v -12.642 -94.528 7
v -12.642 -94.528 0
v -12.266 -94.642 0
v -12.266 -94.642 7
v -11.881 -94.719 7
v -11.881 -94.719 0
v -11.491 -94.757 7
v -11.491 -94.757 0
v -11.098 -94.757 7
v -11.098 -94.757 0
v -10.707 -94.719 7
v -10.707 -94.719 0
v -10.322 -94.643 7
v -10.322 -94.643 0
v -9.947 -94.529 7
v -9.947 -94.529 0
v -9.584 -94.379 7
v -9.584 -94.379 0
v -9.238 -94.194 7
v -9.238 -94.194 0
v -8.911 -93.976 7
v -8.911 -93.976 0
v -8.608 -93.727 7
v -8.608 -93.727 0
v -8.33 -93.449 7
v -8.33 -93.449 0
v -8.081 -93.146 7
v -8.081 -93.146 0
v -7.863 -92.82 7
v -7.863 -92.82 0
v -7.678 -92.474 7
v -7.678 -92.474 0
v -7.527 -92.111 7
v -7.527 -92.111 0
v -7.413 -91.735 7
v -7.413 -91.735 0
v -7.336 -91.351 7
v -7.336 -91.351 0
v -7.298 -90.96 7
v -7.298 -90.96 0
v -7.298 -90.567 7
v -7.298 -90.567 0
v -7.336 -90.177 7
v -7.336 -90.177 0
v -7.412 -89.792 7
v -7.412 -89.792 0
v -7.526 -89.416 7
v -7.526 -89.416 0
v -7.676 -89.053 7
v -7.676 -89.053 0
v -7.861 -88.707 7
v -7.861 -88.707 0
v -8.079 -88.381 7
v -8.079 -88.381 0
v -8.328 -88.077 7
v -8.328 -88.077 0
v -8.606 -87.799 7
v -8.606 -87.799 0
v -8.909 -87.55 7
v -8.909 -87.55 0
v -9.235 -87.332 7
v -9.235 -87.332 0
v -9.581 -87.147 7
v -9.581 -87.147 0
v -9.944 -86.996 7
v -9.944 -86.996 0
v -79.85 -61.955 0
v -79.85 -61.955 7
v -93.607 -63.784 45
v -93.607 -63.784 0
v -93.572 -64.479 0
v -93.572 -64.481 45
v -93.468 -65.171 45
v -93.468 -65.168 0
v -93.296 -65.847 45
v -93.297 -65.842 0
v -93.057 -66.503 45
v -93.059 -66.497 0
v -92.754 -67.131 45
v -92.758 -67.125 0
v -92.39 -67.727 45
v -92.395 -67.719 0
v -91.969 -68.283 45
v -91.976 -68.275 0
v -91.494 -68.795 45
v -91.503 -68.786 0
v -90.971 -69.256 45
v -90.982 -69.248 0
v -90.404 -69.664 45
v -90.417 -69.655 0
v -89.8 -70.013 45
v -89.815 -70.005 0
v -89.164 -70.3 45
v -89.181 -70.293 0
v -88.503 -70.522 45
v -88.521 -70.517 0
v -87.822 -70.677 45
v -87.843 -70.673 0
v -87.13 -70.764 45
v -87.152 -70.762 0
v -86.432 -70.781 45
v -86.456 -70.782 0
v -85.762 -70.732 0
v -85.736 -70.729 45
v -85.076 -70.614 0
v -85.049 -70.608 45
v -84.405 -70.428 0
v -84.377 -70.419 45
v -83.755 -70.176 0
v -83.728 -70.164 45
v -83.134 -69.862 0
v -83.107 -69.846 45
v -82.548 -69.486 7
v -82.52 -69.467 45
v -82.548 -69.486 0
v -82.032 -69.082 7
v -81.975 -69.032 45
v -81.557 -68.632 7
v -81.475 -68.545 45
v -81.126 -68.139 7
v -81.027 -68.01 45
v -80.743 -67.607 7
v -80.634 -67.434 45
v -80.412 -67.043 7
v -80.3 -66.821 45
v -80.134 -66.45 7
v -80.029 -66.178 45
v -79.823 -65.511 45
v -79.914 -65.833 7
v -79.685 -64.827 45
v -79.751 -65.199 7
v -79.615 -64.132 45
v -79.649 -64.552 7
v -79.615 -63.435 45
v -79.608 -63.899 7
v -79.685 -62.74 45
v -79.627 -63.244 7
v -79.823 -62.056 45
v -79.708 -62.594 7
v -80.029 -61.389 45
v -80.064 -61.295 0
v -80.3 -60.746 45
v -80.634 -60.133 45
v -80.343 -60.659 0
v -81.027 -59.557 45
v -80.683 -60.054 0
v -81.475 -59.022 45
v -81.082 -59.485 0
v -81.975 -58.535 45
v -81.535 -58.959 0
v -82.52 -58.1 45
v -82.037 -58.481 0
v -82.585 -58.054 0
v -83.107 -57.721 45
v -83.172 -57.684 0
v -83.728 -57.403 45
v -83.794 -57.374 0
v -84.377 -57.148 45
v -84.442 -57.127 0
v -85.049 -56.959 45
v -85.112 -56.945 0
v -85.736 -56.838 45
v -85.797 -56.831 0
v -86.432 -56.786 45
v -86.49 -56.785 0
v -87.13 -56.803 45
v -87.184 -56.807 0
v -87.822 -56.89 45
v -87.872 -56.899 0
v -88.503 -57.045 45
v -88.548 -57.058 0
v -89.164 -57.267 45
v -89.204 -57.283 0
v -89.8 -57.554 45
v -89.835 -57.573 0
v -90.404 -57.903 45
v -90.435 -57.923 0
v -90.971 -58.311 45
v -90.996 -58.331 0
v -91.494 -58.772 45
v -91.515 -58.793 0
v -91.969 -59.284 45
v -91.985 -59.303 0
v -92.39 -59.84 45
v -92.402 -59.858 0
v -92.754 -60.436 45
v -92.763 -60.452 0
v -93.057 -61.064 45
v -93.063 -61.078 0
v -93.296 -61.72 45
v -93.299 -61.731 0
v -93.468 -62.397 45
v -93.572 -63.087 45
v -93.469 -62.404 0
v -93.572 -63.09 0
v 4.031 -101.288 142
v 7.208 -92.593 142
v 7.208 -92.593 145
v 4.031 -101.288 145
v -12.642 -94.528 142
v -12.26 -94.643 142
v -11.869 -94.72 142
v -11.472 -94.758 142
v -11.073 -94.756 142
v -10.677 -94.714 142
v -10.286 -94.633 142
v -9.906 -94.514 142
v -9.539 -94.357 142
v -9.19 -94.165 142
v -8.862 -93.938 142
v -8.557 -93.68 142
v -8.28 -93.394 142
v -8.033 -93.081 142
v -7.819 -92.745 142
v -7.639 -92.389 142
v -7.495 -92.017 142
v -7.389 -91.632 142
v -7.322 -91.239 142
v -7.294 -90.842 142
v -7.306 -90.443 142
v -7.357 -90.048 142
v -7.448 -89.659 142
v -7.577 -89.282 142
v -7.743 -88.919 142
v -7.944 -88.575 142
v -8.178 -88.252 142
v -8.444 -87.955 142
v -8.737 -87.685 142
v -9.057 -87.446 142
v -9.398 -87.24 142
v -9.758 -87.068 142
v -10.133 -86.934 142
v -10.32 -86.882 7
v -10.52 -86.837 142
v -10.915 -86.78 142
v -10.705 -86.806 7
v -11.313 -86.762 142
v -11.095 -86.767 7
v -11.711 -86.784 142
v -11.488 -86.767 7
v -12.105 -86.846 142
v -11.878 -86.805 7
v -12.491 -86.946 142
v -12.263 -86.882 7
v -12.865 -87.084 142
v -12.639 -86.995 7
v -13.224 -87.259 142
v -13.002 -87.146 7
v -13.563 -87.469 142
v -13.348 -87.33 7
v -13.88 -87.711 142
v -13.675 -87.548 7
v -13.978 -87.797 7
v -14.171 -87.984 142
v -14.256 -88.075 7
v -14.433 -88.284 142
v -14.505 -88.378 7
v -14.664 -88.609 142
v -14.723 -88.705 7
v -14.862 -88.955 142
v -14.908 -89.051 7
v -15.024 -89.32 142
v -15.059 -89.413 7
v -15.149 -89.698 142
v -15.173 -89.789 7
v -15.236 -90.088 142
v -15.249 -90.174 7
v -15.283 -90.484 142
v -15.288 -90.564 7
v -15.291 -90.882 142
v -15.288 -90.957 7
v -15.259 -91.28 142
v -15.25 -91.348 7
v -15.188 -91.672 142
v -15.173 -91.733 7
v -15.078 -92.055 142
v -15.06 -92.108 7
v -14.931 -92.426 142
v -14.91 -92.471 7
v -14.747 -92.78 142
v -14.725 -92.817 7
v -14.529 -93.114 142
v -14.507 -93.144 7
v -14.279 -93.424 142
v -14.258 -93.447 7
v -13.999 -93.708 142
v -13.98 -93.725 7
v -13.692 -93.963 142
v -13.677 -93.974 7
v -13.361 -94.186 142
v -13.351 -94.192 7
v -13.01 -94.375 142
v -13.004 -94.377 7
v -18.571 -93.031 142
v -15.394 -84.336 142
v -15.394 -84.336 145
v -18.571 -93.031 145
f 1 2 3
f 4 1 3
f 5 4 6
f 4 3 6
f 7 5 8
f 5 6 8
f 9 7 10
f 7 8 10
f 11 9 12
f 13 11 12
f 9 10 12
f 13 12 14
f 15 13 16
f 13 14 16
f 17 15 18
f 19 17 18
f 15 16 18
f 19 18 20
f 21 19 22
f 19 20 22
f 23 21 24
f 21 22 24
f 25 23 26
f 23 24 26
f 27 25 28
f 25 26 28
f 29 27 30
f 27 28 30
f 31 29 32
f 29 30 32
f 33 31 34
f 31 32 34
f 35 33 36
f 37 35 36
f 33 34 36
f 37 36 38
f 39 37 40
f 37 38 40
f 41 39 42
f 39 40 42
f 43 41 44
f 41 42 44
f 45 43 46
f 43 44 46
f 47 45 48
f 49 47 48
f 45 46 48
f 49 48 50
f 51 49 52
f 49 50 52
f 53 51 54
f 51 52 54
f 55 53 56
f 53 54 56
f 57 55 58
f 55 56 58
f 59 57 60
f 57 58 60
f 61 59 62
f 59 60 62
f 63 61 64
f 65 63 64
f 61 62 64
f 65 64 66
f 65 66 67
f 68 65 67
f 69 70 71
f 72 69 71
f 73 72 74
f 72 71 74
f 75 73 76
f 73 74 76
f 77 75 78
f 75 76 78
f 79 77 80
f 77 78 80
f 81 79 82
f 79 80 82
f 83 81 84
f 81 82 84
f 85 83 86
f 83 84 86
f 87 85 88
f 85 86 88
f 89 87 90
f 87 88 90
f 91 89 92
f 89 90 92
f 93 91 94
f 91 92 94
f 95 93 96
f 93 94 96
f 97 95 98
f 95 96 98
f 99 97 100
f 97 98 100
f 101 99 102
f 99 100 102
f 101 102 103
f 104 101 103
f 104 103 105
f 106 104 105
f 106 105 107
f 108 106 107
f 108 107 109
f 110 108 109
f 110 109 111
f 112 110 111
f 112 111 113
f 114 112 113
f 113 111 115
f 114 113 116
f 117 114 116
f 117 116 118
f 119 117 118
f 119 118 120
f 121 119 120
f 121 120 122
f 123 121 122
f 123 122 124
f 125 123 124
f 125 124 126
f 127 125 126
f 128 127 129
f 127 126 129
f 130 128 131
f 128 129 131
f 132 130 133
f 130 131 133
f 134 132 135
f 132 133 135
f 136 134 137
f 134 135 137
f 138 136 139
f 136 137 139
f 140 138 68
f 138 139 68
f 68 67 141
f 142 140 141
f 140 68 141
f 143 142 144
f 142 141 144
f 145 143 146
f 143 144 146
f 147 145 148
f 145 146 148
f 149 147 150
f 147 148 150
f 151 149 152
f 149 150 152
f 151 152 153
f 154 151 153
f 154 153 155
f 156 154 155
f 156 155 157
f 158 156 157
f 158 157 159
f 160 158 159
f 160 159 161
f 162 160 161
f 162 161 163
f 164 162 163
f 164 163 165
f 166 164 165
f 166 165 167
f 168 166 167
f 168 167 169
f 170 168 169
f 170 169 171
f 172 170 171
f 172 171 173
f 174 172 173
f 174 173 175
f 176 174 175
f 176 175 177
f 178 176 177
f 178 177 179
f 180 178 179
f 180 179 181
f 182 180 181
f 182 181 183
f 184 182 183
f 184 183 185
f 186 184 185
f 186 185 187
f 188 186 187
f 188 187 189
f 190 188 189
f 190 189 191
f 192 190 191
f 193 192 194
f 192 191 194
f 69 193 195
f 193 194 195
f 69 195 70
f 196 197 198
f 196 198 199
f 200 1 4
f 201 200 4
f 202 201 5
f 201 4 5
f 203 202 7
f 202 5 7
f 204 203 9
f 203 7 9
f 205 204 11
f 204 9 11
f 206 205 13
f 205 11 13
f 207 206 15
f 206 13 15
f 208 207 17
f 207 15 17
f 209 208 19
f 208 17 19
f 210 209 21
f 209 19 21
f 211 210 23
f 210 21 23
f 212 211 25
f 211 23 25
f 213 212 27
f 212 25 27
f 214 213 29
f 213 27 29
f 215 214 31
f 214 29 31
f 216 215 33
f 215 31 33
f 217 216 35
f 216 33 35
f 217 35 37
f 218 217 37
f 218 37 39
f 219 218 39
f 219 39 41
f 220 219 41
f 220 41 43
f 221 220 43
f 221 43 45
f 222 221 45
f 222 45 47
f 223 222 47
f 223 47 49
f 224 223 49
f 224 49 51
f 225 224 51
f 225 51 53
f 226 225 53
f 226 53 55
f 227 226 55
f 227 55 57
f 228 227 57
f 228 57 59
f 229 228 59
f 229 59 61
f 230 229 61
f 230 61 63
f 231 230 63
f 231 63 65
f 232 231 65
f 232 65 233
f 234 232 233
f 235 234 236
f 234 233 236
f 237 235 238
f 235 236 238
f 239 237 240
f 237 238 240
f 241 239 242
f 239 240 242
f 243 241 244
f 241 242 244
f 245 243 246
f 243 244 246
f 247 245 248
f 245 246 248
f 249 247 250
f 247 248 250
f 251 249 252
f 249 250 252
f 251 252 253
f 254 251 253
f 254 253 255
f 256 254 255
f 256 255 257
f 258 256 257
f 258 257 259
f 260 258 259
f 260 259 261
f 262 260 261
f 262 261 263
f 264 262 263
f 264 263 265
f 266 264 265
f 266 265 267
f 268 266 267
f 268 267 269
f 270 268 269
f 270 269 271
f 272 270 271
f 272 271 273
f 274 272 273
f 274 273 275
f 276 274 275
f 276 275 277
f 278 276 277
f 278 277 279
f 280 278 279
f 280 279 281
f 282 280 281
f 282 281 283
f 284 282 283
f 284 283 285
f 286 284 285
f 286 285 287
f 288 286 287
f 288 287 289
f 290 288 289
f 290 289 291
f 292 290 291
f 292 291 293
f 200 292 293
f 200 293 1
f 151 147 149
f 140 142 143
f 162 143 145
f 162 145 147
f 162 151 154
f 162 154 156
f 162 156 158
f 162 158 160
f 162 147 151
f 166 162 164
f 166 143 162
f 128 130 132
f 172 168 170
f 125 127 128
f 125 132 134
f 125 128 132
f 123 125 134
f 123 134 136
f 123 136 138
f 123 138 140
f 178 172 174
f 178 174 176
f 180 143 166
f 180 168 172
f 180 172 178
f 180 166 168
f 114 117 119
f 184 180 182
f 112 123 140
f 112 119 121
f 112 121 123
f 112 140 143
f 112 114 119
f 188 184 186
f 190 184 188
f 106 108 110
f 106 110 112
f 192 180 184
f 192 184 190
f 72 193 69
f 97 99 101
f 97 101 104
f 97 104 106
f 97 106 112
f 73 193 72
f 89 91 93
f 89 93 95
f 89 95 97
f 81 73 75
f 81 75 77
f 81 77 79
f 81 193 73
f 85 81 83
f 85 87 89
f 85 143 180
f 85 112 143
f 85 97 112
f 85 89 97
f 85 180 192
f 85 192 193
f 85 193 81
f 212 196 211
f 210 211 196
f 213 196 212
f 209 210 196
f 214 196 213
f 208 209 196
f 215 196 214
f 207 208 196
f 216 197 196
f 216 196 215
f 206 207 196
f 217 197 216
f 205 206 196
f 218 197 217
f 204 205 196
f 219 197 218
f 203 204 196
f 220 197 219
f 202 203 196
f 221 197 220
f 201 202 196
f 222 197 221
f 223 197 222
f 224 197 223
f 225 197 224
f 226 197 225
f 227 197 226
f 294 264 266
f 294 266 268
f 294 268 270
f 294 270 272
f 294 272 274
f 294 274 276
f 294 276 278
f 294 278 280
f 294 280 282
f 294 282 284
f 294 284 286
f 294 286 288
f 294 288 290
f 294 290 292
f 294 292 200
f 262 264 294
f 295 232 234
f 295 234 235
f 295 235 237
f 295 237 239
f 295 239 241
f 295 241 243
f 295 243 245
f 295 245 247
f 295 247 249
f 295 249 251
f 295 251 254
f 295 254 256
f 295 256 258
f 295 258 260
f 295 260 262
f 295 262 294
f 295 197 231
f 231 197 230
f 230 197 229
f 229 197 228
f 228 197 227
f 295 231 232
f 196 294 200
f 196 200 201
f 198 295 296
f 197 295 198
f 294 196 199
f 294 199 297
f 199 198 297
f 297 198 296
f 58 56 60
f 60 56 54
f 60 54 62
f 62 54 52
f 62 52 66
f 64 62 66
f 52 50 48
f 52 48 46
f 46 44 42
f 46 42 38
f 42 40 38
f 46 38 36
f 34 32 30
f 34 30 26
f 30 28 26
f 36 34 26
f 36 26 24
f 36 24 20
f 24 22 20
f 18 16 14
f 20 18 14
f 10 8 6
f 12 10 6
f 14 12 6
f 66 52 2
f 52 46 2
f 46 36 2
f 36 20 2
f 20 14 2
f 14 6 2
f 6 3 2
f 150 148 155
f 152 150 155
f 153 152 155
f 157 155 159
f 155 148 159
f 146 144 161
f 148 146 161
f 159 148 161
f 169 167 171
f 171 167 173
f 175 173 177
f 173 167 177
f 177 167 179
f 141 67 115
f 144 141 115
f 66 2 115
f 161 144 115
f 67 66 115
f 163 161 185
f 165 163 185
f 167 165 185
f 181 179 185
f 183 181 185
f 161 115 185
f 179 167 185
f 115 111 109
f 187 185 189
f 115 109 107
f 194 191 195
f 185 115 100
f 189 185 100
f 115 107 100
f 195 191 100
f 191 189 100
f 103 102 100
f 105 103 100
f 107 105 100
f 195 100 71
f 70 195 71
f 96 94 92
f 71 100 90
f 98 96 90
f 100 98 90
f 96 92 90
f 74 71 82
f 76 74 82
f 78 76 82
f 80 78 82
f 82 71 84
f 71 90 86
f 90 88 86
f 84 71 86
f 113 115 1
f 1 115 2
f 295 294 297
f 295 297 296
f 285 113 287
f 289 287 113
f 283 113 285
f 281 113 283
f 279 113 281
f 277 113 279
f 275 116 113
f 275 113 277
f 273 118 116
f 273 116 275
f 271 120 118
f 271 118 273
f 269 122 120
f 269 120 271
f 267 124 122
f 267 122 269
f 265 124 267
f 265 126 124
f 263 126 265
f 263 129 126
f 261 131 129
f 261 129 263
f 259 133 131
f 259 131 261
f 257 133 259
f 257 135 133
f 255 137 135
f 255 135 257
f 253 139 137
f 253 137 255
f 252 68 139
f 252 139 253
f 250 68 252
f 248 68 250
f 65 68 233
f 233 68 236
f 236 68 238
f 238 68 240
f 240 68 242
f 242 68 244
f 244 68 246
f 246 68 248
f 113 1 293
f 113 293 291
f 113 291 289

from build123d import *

# Parameters (mm, degrees)
SKETCH_1_R      = 7
EXTRUDE_1_DEPTH = 45
EXTRUDE_2_DEPTH = 7
SKETCH_7_R      = 4
EXTRUDE_3_DEPTH = 135
EXTRUDE_4_DEPTH = 3


with BuildPart() as part:
    # 草图1 → 凸台-拉伸1 (new body)
    with BuildSketch(Plane.XY):
        with Locations(Location((-86.606649797, -63.783530386, 0), (0, 0, 180))):
            Circle(SKETCH_1_R)
    extrude(amount=EXTRUDE_1_DEPTH)

    # 草图3 → 凸台-拉伸2 (add)
    with BuildSketch(Plane(origin=(0, 0, 0), x_dir=(-1, 0, 0), z_dir=(0, 0, -1))):
        with BuildLine():
            Line((87.955581339, -67.549215409), (12.641880873, -94.52784625))
            ThreePointArc((12.641880873, -94.52784625), (7.527264308, -92.111092769), (9.944017789, -86.996476204))
            Line((9.944017789, -86.996476204), (85.257718255, -60.017845362))
            ThreePointArc((85.257718255, -60.017845362), (90.37233482, -62.434598843), (87.955581339, -67.549215409))
        make_face()
    extrude(amount=-EXTRUDE_2_DEPTH)

    # 草图7 → 凸台-拉伸3 (add)
    with BuildSketch(Plane.XY.offset(7)):
        with Locations(Location((-11.292949331, -90.762161227, 0), (0, 0, 250.291624105))):
            Circle(SKETCH_7_R)
    extrude(amount=EXTRUDE_3_DEPTH)

    # 草图8 → 凸台-拉伸4 (add)
    with BuildSketch(Plane.XY.offset(142)):
        Polygon((-15.394140478, -84.335981352), (7.207577452, -92.593097239), (4.030932181, -101.288341605), (-18.57078575, -93.031225719), align=None)
    extrude(amount=EXTRUDE_4_DEPTH)


solid = part.part
